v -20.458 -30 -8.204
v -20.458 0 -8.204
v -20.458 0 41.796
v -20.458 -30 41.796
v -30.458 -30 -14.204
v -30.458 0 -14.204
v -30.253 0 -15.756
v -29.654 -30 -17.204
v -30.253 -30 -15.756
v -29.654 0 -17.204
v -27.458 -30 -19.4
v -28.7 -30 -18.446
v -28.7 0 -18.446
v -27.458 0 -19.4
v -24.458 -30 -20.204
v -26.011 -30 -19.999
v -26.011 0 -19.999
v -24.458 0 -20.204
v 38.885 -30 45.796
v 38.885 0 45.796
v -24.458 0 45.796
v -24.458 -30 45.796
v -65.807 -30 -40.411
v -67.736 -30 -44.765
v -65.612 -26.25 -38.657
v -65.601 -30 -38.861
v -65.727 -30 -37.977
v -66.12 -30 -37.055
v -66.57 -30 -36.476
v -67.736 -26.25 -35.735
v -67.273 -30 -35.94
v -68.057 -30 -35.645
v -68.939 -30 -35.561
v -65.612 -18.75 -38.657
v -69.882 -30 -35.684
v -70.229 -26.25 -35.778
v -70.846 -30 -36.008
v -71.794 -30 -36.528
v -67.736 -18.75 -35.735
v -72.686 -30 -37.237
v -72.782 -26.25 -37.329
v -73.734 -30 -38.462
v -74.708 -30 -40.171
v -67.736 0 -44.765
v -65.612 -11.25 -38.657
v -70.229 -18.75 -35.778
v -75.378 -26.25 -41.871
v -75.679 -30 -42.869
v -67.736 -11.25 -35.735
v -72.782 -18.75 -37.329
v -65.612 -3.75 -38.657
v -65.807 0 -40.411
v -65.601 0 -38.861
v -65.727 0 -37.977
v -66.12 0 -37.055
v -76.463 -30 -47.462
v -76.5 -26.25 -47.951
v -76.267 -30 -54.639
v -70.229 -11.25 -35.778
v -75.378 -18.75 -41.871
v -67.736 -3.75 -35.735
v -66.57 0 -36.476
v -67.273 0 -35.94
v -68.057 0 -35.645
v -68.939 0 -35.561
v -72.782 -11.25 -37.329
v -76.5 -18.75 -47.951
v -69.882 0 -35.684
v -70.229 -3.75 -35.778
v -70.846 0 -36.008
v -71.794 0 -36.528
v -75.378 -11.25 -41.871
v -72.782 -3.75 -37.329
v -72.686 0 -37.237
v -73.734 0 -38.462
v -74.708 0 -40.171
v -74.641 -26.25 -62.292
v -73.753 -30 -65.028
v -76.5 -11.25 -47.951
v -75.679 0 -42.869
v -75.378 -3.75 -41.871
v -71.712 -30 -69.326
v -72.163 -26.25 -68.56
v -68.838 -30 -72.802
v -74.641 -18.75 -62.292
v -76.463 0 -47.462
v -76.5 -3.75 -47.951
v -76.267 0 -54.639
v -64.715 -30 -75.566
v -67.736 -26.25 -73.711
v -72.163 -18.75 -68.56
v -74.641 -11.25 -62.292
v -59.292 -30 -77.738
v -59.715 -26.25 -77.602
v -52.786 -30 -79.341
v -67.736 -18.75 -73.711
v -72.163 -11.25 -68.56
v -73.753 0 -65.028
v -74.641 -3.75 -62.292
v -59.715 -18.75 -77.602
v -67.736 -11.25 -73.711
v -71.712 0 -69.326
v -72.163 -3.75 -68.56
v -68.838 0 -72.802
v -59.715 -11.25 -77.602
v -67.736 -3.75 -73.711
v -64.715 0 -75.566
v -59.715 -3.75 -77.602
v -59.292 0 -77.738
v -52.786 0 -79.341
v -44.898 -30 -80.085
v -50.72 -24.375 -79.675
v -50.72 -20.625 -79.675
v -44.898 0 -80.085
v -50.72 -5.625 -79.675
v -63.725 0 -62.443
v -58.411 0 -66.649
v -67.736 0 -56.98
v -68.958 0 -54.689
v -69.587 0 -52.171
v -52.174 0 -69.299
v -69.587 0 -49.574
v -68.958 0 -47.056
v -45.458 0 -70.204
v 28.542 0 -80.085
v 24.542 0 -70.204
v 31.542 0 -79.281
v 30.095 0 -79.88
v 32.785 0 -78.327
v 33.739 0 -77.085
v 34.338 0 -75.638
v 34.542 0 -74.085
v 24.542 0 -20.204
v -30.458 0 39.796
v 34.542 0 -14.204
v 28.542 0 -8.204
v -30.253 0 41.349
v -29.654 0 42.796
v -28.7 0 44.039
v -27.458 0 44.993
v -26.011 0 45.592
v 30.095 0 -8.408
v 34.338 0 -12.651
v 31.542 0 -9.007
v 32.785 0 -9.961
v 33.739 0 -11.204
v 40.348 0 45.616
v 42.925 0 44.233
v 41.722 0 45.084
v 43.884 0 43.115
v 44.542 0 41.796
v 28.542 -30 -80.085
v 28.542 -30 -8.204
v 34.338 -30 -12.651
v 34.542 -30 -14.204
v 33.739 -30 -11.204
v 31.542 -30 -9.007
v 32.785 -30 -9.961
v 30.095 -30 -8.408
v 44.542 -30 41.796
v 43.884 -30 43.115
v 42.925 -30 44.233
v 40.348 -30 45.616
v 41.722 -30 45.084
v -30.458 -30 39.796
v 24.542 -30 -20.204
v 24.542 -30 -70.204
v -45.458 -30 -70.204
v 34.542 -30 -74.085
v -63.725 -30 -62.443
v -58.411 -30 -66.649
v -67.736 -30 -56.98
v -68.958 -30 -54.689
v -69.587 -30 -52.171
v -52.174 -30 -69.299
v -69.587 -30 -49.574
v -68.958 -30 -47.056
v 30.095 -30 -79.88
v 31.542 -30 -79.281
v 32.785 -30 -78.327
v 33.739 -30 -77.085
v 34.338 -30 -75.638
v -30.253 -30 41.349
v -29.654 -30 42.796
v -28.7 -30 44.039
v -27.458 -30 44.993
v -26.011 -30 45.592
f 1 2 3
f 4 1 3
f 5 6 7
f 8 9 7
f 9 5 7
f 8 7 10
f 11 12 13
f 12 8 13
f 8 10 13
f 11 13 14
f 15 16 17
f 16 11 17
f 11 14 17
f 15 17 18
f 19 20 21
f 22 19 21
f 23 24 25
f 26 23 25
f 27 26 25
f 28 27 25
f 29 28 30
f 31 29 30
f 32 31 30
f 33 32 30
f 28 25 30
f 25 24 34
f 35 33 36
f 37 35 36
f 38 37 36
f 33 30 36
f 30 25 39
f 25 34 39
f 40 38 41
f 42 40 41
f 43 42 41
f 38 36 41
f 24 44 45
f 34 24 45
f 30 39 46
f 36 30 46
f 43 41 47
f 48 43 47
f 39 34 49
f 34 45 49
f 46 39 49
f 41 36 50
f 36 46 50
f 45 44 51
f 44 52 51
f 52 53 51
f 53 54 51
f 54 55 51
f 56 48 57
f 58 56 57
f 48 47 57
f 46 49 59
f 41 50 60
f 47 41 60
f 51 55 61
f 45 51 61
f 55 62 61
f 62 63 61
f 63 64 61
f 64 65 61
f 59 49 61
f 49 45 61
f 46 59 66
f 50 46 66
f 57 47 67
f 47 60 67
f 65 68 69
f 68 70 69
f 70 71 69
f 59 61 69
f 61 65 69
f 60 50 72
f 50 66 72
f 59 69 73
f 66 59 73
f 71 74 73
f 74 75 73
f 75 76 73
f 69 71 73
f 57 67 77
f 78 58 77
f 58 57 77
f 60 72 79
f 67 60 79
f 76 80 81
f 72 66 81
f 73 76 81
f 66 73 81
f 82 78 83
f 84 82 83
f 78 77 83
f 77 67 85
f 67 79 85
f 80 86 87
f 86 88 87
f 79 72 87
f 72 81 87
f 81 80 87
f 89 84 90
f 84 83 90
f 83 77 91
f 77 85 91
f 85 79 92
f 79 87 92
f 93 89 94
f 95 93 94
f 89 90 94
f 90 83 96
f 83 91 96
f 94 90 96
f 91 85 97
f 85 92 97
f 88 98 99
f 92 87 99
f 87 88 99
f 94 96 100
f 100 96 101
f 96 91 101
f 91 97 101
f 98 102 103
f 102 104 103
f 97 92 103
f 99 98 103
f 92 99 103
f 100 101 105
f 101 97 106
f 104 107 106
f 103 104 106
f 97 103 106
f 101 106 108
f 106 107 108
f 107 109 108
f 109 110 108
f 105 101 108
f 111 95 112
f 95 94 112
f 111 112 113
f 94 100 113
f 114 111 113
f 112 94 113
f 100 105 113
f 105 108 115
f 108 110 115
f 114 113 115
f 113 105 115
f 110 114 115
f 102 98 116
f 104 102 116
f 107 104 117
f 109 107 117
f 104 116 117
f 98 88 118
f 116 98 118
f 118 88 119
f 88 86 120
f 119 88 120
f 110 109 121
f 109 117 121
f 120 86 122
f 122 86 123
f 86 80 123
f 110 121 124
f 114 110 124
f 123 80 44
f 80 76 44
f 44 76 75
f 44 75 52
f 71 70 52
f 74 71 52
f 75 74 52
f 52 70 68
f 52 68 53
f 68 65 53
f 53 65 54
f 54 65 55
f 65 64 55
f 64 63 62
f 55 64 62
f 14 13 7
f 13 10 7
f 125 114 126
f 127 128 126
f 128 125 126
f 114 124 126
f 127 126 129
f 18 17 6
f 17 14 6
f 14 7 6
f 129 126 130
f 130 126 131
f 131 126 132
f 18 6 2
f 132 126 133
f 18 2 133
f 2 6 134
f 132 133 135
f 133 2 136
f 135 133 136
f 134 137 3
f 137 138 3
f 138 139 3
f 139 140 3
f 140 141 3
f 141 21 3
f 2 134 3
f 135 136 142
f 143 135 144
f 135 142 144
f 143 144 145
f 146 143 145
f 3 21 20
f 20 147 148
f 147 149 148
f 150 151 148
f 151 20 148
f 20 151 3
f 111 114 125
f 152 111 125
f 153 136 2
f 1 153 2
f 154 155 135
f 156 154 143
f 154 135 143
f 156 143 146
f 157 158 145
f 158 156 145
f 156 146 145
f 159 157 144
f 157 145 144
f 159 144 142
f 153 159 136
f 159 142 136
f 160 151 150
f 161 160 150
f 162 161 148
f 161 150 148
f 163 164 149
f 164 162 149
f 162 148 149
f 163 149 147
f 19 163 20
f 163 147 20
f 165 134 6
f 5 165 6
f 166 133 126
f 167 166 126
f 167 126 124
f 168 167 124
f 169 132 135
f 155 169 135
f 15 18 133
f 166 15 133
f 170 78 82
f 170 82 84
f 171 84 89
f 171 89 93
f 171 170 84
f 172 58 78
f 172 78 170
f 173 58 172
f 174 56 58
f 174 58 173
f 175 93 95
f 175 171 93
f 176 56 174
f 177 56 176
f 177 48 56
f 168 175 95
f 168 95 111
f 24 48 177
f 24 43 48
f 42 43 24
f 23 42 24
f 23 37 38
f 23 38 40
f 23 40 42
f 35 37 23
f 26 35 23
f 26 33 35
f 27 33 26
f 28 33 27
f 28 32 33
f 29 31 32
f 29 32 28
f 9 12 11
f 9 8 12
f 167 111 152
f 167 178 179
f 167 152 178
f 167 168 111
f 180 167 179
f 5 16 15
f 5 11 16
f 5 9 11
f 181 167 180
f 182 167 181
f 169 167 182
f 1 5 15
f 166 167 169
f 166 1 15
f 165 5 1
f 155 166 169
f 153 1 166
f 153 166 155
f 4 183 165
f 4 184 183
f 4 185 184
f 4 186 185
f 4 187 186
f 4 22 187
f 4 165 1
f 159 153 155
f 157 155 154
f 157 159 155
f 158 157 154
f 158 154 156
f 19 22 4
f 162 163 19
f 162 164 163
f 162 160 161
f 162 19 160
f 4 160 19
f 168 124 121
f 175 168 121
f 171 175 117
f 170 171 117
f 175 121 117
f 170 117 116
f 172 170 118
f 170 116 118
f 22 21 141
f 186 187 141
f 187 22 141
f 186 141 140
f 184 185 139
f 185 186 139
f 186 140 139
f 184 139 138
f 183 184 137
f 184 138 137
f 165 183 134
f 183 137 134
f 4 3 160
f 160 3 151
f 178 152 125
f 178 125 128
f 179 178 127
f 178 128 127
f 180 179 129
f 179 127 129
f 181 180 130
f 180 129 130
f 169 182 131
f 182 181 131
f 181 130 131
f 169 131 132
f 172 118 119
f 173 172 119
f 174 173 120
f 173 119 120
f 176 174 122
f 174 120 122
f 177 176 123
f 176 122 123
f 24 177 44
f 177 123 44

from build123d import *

# Parameters (mm, degrees)
F1_DEPTH    = 30
F2_T1_DEPTH = 60
F2_T3_DEPTH = 58.2842712475


# Not quite as in the source:
# - a fillet or chamfer that OpenCascade refuses, or shapes differently, is made with other operations: its cross-section is extruded or revolved along the edge and cut away or added


with BuildPart() as f1:
    # F0 (on Front) → F1 (new body)
    with BuildSketch(Plane.XZ):
        with BuildLine():
            Line((-20.4576485604, 41.7964319587), (44.5423514396, 41.7964319587))
            Line((44.5423514396, 41.7964319587), (44.5423514396, 45.7964319587))
            Line((44.5423514396, 45.7964319587), (-30.4576485604, 45.7964319587))
            Line((-30.4576485604, 45.7964319587), (-30.4576485604, -20.2035680413))
            Line((-30.4576485604, -20.2035680413), (24.5423514396, -20.2035680413))
            Line((24.5423514396, -20.2035680413), (24.5423514396, -70.2035680413))
            Line((24.5423514396, -70.2035680413), (-45.4576485604, -70.2035680413))
            ThreePointArc((-45.4576485604, -70.2035680413), (-58.4112677552, -66.6488561684), (-67.7362307906, -56.9804906845))
            ThreePointArc((-67.7362307906, -56.9804906845), (-69.6667608001, -50.8724953979), (-67.7362307906, -44.7645001113))
            add(Edge.make_bspline(
                [(-67.7362307906, -44.7645001113), (-66.6047282738, -42.6134626855), (-64.6275870644, -38.8548278844), (-67.5118728603, -34.7496923274), (-74.2171267591, -36.6728128022), (-77.5629423301, -48.422372807), (-75.1680740571, -62.4394566894), (-69.641186524, -75.442468141), (-51.6938526184, -79.943801044), (-46.7813036843, -80.045612986), (-44.8976382613, -80.0846517086)],
                knots=[0, 0, 0, 0, 0.1047159829, 0.1829764247, 0.2776975731, 0.4158396611, 0.5724266185, 0.7228497918, 0.8937296562, 1, 1, 1, 1], degree=3))
            Line((-44.8976382613, -80.0846517086), (34.5423514396, -80.0846517086))
            Line((34.5423514396, -80.0846517086), (34.5423514396, -8.2035680413))
            Line((34.5423514396, -8.2035680413), (-20.4576485604, -8.2035680413))
            Line((-20.4576485604, -8.2035680413), (-20.4576485604, 41.7964319587))
        make_face()
    extrude(amount=F1_DEPTH)

    # F2: fillet of radius 6 on 5 edges, made by hand

    # F2_s2 → F2_t1 (cut)
    with BuildSketch(Plane.XZ.offset(-15)):
        with BuildLine():
            ThreePointArc((-24.4576485604, 45.7964319587), (-28.7002892475, 44.0390726458), (-30.4576485604, 39.7964319587))
            Line((-30.4576485604, 39.7964319587), (-30.4576485604, 45.7964319587))
            Line((-30.4576485604, 45.7964319587), (-24.4576485604, 45.7964319587))
        make_face()
        with BuildLine():
            ThreePointArc((-30.4576485604, -14.2035680413), (-28.7002892475, -18.4462087284), (-24.4576485604, -20.2035680413))
            Line((-24.4576485604, -20.2035680413), (-30.4576485604, -20.2035680413))
            Line((-30.4576485604, -20.2035680413), (-30.4576485604, -14.2035680413))
        make_face()
        with BuildLine():
            ThreePointArc((34.5423514396, -14.2035680413), (32.7849921267, -9.9609273542), (28.5423514396, -8.2035680413))
            Line((28.5423514396, -8.2035680413), (34.5423514396, -8.2035680413))
            Line((34.5423514396, -8.2035680413), (34.5423514396, -14.2035680413))
        make_face()
        with BuildLine():
            ThreePointArc((28.5423514396, -80.0846517086), (32.7849921267, -78.3272923957), (34.5423514396, -74.0846517086))
            Line((34.5423514396, -74.0846517086), (34.5423514396, -80.0846517086))
            Line((34.5423514396, -80.0846517086), (28.5423514396, -80.0846517086))
        make_face()
    extrude(amount=F2_T1_DEPTH, mode=Mode.SUBTRACT)

    # F2_s4 → F2_t3 (cut)
    with BuildSketch(Plane.XZ.offset(-14.1421356237)):
        with BuildLine():
            ThreePointArc((44.5423514396, 41.7964319587), (42.3495988052, 44.6954114442), (38.8854971901, 45.7964319587))
            Line((38.8854971901, 45.7964319587), (44.5423514396, 45.7964319587))
            Line((44.5423514396, 45.7964319587), (44.5423514396, 41.7964319587))
        make_face()
    extrude(amount=F2_T3_DEPTH, mode=Mode.SUBTRACT)


solid = f1.part
